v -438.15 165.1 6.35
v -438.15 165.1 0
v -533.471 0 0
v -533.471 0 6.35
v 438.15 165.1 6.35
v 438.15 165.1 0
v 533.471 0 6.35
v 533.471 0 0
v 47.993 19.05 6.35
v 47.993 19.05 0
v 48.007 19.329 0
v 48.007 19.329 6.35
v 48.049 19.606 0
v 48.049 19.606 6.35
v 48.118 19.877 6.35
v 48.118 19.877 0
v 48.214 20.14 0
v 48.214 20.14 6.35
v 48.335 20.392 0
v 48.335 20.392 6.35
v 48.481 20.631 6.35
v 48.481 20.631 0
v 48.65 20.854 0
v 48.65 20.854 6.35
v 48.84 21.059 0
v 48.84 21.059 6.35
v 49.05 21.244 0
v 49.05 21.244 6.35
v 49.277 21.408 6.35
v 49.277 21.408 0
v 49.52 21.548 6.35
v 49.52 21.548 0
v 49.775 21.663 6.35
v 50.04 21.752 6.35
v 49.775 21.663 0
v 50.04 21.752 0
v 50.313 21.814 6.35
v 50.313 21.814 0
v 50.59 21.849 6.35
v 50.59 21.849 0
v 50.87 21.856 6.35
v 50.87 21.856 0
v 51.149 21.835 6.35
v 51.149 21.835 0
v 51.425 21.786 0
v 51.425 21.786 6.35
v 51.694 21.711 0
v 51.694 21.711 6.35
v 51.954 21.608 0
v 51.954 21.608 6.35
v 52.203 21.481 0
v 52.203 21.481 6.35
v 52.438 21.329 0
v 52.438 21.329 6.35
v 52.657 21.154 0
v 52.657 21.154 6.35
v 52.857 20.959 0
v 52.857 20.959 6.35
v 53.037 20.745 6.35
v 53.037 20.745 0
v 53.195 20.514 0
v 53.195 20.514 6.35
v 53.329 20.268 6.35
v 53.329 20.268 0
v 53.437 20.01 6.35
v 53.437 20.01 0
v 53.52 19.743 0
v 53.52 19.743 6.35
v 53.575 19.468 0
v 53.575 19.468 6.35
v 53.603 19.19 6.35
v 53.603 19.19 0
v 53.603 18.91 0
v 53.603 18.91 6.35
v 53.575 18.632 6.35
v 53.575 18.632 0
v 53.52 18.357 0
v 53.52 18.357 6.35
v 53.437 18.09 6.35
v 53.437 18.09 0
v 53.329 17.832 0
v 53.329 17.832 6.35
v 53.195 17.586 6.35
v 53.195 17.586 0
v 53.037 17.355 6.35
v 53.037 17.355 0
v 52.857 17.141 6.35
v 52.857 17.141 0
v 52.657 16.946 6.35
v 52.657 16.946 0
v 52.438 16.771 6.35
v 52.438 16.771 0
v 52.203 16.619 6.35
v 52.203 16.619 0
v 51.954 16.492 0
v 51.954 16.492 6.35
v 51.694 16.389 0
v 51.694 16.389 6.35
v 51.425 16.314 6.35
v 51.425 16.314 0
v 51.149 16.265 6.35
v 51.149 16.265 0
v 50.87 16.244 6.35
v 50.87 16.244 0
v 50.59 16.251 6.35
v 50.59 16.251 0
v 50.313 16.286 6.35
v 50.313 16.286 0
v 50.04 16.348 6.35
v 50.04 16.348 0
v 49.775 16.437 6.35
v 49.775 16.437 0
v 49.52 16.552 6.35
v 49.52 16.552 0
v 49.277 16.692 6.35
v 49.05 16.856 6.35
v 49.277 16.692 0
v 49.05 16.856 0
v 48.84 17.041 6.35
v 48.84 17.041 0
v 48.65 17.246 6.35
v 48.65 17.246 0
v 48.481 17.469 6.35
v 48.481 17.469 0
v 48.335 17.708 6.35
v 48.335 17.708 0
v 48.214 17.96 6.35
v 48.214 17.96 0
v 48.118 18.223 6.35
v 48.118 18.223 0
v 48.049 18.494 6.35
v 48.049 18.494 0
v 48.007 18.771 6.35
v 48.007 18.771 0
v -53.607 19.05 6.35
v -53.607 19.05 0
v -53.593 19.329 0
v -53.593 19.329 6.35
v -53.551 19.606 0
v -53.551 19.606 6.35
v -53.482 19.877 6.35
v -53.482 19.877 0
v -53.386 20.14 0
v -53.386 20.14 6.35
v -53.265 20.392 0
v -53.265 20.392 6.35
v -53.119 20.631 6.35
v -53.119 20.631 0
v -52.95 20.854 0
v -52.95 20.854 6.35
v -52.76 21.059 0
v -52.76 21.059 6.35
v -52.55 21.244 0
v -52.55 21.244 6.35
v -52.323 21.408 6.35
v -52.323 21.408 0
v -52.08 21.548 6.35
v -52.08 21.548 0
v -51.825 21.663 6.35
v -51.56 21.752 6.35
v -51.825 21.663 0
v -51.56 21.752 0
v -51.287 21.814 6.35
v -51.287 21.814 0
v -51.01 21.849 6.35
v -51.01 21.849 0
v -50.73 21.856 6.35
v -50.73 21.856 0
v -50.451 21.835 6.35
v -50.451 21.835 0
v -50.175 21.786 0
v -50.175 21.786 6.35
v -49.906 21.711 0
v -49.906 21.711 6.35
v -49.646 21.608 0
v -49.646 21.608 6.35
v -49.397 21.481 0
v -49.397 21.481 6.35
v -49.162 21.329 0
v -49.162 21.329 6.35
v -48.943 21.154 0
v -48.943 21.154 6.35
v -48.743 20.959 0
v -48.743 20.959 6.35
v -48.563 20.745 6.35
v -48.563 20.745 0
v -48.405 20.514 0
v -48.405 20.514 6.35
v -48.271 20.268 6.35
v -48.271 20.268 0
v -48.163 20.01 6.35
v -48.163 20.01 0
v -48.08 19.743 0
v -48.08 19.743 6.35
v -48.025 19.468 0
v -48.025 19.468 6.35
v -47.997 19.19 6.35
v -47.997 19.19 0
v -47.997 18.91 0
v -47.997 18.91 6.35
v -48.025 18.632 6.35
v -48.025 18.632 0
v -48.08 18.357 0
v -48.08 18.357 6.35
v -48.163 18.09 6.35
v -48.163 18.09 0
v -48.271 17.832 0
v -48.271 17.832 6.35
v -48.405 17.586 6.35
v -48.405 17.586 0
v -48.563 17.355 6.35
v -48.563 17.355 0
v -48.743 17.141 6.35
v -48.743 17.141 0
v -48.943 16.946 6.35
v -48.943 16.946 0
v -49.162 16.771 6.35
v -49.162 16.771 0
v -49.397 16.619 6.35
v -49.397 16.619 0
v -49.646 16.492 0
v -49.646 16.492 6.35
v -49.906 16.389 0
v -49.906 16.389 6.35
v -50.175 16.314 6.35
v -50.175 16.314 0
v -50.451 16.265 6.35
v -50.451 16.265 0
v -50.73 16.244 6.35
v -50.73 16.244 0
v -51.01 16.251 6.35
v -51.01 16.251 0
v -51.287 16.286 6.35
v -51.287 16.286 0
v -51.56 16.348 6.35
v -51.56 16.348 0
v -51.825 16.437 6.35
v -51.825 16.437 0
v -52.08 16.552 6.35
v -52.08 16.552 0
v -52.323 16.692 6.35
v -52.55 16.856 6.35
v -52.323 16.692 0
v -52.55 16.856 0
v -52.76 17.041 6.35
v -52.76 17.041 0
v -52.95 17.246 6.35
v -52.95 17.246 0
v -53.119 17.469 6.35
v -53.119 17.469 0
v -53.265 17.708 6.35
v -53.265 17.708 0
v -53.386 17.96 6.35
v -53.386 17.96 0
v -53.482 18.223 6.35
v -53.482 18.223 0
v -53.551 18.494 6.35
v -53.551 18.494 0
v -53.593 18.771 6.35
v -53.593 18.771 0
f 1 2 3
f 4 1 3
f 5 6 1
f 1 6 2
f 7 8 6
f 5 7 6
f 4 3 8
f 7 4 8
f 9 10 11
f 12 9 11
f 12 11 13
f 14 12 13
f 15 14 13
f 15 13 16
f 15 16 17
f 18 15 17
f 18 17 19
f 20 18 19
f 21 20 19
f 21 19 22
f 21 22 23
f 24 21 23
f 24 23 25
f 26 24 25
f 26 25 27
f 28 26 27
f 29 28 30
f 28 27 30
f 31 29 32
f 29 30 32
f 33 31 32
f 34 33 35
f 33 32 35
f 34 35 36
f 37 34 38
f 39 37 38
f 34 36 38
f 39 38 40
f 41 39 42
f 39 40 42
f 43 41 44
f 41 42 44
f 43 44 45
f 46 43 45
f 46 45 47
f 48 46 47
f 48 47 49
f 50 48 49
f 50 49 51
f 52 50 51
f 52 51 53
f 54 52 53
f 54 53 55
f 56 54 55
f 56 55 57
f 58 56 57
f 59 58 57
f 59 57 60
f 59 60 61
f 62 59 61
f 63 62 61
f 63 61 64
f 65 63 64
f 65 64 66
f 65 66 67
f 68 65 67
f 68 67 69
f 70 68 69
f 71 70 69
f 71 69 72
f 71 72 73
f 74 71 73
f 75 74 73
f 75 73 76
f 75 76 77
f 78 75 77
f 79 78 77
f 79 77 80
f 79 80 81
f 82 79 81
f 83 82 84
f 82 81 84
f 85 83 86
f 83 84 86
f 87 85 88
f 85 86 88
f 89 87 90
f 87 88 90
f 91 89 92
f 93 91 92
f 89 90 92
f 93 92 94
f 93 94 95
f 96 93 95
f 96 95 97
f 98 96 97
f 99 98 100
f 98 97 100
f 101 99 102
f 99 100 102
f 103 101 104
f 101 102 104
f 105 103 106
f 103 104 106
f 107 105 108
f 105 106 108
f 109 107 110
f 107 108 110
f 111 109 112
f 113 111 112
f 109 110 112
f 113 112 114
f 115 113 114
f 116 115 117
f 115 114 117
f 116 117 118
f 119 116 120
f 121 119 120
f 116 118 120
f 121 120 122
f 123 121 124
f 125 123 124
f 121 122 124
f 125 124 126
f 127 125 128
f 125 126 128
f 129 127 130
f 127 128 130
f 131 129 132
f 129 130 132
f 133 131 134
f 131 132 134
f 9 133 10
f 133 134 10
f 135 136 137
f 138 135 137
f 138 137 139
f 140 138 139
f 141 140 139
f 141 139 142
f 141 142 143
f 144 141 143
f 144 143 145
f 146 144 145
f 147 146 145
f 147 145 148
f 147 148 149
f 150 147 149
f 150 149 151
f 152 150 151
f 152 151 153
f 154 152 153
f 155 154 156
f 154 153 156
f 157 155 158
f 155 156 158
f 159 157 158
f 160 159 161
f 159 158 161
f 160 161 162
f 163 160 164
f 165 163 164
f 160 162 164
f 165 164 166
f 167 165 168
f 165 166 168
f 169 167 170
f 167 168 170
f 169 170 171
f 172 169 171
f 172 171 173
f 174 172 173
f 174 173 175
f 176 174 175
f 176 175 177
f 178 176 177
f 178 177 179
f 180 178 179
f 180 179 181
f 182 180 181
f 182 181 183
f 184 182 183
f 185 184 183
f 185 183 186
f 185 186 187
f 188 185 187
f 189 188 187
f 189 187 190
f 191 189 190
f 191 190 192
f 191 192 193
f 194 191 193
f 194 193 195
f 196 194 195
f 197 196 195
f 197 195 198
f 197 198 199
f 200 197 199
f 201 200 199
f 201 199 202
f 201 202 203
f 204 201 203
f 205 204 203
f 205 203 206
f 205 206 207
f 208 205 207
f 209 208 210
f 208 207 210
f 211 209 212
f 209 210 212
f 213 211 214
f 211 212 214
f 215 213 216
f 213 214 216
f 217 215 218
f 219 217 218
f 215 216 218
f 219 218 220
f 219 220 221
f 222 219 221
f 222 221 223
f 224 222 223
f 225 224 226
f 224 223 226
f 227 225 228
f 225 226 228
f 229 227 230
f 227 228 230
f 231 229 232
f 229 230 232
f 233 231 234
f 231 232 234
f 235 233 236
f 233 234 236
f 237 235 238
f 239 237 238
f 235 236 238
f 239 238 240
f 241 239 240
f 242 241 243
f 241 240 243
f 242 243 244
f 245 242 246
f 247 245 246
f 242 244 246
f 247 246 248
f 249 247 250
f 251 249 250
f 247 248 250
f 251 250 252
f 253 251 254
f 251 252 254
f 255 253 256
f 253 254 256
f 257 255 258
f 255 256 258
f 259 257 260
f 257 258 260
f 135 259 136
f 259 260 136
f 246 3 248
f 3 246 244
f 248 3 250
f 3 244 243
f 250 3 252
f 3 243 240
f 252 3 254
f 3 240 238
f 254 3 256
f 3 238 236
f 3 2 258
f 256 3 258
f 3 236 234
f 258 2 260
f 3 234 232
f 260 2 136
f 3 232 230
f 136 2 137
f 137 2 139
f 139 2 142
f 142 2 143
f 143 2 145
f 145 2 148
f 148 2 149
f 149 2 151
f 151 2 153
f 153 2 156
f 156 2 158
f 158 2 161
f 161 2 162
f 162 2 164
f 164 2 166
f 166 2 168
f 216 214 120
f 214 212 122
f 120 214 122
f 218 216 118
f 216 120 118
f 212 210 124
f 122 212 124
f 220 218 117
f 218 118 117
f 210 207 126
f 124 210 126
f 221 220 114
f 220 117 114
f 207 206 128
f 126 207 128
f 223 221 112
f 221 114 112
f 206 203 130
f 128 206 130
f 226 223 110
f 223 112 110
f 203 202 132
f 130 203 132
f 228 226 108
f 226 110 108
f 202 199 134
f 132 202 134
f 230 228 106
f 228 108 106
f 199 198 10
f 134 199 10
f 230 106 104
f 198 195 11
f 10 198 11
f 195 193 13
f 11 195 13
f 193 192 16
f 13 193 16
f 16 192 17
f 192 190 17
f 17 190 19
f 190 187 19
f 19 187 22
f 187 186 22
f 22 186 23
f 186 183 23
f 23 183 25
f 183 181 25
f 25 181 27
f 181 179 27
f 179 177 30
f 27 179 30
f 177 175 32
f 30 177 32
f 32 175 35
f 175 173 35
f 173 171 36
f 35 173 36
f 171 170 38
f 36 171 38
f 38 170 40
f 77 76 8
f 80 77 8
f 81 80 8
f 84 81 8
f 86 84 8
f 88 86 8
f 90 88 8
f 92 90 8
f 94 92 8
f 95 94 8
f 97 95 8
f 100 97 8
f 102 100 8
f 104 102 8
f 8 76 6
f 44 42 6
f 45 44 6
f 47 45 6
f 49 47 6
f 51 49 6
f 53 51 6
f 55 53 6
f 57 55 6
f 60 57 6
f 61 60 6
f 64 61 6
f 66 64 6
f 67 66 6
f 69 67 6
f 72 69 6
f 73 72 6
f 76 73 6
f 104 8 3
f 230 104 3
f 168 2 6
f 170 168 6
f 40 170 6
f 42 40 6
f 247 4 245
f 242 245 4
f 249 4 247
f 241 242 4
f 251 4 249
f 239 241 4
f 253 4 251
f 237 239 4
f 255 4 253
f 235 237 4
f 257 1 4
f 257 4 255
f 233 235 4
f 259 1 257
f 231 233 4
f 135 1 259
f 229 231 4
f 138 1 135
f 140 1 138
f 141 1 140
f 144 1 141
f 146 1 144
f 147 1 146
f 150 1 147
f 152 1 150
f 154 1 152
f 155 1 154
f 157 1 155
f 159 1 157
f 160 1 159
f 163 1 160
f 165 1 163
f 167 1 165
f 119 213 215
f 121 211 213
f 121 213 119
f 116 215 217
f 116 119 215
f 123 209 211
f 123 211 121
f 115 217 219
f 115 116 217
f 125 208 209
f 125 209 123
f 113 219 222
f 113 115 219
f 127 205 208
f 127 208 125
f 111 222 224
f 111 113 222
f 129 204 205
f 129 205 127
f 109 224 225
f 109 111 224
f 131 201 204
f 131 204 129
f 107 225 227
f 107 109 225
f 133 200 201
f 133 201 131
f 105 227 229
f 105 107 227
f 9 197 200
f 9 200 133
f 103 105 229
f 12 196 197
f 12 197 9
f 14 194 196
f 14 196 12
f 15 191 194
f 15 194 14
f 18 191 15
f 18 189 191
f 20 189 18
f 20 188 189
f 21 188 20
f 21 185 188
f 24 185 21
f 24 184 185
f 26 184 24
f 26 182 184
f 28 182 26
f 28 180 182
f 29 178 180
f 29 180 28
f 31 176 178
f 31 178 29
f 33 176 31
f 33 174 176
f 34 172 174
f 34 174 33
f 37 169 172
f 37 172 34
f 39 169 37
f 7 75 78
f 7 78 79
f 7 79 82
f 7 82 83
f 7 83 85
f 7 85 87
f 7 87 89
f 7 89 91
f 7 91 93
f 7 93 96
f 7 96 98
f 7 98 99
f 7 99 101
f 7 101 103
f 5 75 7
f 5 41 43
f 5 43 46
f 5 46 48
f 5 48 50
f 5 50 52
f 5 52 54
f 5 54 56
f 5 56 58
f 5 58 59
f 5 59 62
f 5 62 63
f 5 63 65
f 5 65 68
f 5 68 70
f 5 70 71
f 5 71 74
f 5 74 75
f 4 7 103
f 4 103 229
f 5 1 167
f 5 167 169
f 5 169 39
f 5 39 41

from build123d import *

# Parameters (mm, degrees)
BOSS_EXTRUDE1_DEPTH    = 6.35
F_10_CLEARANCE_HOLE1_D = 5.6134


with BuildPart() as part:
    # Sketch1 → Boss-Extrude1 (new body)
    with BuildSketch(Plane.XY):
        Polygon((-533.470529443, 0), (533.470529443, 0), (438.15, 165.1), (-438.15, 165.1), align=None)
    extrude(amount=BOSS_EXTRUDE1_DEPTH)

    # #10 Clearance Hole1 (through all)
    with Locations(Plane.XY.offset(6.35)):
        with Locations((-50.8, 19.05), (50.8, 19.05)):
            Hole(F_10_CLEARANCE_HOLE1_D / 2)


solid = part.part
